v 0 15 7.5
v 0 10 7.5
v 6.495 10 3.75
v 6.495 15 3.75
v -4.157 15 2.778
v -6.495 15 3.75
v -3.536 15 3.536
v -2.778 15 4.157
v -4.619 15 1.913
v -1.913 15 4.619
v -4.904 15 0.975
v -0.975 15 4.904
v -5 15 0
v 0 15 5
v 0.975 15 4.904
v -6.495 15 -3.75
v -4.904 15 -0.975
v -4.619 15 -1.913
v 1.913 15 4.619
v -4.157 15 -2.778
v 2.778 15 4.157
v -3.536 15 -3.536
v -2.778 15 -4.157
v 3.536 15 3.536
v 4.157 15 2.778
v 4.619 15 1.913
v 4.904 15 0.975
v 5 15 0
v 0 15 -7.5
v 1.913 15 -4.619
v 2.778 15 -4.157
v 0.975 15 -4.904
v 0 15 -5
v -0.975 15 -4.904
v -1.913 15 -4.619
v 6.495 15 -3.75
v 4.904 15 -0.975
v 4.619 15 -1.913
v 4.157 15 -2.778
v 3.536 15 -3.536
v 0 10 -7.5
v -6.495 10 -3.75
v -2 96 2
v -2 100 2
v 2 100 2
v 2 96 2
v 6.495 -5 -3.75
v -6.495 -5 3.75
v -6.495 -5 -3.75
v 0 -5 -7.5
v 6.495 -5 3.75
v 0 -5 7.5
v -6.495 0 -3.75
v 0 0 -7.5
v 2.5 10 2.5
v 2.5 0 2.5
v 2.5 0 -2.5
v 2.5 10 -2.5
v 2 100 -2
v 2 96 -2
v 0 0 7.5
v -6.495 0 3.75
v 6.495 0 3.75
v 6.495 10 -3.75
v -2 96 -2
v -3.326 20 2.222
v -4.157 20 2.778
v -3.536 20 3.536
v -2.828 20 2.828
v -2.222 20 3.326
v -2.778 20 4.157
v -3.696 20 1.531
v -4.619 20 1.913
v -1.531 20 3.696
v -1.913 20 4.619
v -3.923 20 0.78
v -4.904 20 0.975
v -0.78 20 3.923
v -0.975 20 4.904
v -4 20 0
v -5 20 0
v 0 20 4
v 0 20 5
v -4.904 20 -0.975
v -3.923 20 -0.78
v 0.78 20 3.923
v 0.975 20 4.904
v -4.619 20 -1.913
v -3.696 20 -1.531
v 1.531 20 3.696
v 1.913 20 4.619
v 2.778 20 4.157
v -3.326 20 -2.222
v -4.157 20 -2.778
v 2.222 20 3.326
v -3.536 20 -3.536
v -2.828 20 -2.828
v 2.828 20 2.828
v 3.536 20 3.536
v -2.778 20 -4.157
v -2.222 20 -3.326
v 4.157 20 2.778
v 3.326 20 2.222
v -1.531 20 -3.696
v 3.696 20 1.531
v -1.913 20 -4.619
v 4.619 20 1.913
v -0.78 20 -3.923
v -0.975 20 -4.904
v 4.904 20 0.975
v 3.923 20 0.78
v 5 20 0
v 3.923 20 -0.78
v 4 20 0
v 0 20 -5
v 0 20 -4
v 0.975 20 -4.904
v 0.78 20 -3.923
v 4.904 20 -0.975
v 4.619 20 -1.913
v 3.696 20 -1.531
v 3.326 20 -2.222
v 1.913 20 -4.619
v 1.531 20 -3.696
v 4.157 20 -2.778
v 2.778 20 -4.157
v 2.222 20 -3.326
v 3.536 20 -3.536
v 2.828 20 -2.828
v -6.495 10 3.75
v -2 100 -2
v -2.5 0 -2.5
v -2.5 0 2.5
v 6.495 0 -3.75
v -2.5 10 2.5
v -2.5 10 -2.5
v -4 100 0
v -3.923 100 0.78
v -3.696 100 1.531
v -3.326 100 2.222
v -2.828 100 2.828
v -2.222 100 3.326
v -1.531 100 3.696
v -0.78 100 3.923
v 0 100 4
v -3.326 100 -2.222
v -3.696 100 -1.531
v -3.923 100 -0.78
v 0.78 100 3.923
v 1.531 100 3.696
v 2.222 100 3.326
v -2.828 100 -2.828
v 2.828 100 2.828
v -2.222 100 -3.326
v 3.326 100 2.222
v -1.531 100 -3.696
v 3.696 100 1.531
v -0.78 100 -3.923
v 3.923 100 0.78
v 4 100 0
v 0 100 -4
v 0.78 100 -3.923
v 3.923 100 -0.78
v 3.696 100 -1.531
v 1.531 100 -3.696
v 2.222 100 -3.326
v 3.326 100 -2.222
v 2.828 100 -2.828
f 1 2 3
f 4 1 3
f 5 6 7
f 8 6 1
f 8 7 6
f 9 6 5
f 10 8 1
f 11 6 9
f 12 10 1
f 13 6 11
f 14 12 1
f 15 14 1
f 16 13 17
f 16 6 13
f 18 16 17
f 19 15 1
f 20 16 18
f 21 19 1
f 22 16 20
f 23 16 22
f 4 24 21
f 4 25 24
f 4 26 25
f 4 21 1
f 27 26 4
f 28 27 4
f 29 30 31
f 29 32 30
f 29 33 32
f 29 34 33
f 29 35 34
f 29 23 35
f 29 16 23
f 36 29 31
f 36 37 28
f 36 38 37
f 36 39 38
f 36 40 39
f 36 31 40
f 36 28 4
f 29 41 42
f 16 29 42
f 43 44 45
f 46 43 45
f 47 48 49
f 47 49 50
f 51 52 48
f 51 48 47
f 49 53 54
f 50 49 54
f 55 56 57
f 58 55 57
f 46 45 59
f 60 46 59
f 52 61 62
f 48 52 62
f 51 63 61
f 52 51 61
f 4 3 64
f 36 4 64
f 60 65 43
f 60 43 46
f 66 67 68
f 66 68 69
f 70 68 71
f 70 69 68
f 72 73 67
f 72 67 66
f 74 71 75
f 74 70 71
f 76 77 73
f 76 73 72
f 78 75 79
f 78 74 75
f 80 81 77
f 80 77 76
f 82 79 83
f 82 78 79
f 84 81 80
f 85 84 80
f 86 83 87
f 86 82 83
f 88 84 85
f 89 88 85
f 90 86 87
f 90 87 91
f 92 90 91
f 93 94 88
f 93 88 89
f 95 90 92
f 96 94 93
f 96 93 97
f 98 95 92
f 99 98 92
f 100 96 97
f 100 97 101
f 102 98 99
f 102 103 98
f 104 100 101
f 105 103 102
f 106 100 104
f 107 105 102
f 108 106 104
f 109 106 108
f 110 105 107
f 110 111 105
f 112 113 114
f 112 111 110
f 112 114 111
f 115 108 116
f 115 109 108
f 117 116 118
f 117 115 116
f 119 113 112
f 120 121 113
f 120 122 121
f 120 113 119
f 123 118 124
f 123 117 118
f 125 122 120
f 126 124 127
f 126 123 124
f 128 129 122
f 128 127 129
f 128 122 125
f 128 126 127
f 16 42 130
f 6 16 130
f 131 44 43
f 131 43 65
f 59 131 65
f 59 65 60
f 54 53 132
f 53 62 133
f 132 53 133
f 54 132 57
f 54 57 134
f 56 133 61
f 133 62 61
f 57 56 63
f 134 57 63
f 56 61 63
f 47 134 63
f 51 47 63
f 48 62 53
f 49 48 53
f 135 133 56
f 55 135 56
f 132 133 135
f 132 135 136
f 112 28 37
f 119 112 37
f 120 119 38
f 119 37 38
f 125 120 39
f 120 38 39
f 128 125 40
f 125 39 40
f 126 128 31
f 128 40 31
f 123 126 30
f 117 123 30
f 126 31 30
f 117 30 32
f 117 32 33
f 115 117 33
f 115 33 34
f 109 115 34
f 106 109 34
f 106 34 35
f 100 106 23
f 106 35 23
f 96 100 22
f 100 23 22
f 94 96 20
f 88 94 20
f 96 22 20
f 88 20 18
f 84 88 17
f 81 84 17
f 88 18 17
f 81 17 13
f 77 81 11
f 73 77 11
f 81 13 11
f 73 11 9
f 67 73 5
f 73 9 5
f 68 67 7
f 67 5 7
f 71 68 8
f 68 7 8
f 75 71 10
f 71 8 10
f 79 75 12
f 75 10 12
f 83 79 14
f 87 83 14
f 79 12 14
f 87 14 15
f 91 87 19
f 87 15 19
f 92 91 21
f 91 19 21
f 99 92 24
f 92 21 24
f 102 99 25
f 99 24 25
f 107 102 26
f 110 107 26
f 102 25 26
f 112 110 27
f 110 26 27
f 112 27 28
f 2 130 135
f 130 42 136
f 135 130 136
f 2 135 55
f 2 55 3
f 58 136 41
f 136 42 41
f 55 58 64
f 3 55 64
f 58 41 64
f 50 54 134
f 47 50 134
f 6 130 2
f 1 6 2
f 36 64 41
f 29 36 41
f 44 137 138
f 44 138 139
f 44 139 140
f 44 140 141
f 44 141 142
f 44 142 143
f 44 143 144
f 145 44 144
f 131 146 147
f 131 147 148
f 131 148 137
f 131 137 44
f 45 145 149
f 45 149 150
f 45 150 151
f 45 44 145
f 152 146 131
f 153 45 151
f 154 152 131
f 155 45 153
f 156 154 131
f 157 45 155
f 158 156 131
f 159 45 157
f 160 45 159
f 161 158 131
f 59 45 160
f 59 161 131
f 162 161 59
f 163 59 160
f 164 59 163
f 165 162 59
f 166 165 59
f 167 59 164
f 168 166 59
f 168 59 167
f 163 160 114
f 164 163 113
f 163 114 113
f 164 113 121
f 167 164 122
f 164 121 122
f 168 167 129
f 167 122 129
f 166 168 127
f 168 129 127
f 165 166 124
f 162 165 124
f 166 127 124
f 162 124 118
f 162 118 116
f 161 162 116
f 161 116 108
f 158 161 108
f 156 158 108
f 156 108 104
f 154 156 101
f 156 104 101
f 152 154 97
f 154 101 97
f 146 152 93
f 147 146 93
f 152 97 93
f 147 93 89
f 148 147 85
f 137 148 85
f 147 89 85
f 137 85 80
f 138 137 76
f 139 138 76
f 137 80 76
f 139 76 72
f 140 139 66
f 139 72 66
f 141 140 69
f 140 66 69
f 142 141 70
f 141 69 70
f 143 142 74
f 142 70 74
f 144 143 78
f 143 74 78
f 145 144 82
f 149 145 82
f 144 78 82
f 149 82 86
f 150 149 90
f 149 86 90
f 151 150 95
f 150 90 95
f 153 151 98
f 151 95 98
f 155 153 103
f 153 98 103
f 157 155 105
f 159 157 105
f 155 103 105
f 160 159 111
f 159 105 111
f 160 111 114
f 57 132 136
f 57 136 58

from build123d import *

# Parameters (mm, degrees)
SKETCH1_W           = 5
SKETCH1_H           = 5
BOSS_EXTRUDE1_DEPTH = 10
BOSS_EXTRUDE2_DEPTH = 5
BOSS_EXTRUDE3_DEPTH = 5
SKETCH4_R           = 5
BOSS_EXTRUDE4_DEPTH = 5
SKETCH5_R           = 4
BOSS_EXTRUDE5_DEPTH = 80
SKETCH6_W           = 4
SKETCH6_H           = 4
CUT_EXTRUDE1_DEPTH  = 4


with BuildPart() as part:
    # Sketch1 → Boss-Extrude1 (new body)
    with BuildSketch(Plane(origin=(0, 0, 0), x_dir=(1, 0, 0), z_dir=(0, 1, 0))):
        Rectangle(SKETCH1_W, SKETCH1_H)
    extrude(amount=BOSS_EXTRUDE1_DEPTH)

    # Sketch2 → Boss-Extrude2 (add)
    with BuildSketch(Plane.XZ):
        Polygon((0, 7.5), (-6.495190528, 3.75), (-6.495190528, -3.75), (0, -7.5), (6.495190528, -3.75), (6.495190528, 3.75), align=None)
    extrude(amount=BOSS_EXTRUDE2_DEPTH)

    # Sketch3 → Boss-Extrude3 (add)
    with BuildSketch(Plane(origin=(0, 10, 0), x_dir=(1, 0, 0), z_dir=(0, 1, 0))):
        Polygon((0, -7.5), (6.495190528, -3.75), (6.495190528, 3.75), (0, 7.5), (-6.495190528, 3.75), (-6.495190528, -3.75), align=None)
    extrude(amount=BOSS_EXTRUDE3_DEPTH)

    # Sketch4 → Boss-Extrude4 (add)
    with BuildSketch(Plane(origin=(0, 15, 0), x_dir=(1, 0, 0), z_dir=(0, 1, 0))):
        Circle(SKETCH4_R)
    extrude(amount=BOSS_EXTRUDE4_DEPTH)

    # Sketch5 → Boss-Extrude5 (add)
    with BuildSketch(Plane(origin=(0, 20, 0), x_dir=(1, 0, 0), z_dir=(0, 1, 0))):
        Circle(SKETCH5_R)
    extrude(amount=BOSS_EXTRUDE5_DEPTH)

    # Sketch6 → Cut-Extrude1 (cut)
    with BuildSketch(Plane(origin=(0, 100, 0), x_dir=(1, 0, 0), z_dir=(0, 1, 0))):
        Rectangle(SKETCH6_W, SKETCH6_H)
    extrude(amount=-CUT_EXTRUDE1_DEPTH, mode=Mode.SUBTRACT)


solid = part.part
